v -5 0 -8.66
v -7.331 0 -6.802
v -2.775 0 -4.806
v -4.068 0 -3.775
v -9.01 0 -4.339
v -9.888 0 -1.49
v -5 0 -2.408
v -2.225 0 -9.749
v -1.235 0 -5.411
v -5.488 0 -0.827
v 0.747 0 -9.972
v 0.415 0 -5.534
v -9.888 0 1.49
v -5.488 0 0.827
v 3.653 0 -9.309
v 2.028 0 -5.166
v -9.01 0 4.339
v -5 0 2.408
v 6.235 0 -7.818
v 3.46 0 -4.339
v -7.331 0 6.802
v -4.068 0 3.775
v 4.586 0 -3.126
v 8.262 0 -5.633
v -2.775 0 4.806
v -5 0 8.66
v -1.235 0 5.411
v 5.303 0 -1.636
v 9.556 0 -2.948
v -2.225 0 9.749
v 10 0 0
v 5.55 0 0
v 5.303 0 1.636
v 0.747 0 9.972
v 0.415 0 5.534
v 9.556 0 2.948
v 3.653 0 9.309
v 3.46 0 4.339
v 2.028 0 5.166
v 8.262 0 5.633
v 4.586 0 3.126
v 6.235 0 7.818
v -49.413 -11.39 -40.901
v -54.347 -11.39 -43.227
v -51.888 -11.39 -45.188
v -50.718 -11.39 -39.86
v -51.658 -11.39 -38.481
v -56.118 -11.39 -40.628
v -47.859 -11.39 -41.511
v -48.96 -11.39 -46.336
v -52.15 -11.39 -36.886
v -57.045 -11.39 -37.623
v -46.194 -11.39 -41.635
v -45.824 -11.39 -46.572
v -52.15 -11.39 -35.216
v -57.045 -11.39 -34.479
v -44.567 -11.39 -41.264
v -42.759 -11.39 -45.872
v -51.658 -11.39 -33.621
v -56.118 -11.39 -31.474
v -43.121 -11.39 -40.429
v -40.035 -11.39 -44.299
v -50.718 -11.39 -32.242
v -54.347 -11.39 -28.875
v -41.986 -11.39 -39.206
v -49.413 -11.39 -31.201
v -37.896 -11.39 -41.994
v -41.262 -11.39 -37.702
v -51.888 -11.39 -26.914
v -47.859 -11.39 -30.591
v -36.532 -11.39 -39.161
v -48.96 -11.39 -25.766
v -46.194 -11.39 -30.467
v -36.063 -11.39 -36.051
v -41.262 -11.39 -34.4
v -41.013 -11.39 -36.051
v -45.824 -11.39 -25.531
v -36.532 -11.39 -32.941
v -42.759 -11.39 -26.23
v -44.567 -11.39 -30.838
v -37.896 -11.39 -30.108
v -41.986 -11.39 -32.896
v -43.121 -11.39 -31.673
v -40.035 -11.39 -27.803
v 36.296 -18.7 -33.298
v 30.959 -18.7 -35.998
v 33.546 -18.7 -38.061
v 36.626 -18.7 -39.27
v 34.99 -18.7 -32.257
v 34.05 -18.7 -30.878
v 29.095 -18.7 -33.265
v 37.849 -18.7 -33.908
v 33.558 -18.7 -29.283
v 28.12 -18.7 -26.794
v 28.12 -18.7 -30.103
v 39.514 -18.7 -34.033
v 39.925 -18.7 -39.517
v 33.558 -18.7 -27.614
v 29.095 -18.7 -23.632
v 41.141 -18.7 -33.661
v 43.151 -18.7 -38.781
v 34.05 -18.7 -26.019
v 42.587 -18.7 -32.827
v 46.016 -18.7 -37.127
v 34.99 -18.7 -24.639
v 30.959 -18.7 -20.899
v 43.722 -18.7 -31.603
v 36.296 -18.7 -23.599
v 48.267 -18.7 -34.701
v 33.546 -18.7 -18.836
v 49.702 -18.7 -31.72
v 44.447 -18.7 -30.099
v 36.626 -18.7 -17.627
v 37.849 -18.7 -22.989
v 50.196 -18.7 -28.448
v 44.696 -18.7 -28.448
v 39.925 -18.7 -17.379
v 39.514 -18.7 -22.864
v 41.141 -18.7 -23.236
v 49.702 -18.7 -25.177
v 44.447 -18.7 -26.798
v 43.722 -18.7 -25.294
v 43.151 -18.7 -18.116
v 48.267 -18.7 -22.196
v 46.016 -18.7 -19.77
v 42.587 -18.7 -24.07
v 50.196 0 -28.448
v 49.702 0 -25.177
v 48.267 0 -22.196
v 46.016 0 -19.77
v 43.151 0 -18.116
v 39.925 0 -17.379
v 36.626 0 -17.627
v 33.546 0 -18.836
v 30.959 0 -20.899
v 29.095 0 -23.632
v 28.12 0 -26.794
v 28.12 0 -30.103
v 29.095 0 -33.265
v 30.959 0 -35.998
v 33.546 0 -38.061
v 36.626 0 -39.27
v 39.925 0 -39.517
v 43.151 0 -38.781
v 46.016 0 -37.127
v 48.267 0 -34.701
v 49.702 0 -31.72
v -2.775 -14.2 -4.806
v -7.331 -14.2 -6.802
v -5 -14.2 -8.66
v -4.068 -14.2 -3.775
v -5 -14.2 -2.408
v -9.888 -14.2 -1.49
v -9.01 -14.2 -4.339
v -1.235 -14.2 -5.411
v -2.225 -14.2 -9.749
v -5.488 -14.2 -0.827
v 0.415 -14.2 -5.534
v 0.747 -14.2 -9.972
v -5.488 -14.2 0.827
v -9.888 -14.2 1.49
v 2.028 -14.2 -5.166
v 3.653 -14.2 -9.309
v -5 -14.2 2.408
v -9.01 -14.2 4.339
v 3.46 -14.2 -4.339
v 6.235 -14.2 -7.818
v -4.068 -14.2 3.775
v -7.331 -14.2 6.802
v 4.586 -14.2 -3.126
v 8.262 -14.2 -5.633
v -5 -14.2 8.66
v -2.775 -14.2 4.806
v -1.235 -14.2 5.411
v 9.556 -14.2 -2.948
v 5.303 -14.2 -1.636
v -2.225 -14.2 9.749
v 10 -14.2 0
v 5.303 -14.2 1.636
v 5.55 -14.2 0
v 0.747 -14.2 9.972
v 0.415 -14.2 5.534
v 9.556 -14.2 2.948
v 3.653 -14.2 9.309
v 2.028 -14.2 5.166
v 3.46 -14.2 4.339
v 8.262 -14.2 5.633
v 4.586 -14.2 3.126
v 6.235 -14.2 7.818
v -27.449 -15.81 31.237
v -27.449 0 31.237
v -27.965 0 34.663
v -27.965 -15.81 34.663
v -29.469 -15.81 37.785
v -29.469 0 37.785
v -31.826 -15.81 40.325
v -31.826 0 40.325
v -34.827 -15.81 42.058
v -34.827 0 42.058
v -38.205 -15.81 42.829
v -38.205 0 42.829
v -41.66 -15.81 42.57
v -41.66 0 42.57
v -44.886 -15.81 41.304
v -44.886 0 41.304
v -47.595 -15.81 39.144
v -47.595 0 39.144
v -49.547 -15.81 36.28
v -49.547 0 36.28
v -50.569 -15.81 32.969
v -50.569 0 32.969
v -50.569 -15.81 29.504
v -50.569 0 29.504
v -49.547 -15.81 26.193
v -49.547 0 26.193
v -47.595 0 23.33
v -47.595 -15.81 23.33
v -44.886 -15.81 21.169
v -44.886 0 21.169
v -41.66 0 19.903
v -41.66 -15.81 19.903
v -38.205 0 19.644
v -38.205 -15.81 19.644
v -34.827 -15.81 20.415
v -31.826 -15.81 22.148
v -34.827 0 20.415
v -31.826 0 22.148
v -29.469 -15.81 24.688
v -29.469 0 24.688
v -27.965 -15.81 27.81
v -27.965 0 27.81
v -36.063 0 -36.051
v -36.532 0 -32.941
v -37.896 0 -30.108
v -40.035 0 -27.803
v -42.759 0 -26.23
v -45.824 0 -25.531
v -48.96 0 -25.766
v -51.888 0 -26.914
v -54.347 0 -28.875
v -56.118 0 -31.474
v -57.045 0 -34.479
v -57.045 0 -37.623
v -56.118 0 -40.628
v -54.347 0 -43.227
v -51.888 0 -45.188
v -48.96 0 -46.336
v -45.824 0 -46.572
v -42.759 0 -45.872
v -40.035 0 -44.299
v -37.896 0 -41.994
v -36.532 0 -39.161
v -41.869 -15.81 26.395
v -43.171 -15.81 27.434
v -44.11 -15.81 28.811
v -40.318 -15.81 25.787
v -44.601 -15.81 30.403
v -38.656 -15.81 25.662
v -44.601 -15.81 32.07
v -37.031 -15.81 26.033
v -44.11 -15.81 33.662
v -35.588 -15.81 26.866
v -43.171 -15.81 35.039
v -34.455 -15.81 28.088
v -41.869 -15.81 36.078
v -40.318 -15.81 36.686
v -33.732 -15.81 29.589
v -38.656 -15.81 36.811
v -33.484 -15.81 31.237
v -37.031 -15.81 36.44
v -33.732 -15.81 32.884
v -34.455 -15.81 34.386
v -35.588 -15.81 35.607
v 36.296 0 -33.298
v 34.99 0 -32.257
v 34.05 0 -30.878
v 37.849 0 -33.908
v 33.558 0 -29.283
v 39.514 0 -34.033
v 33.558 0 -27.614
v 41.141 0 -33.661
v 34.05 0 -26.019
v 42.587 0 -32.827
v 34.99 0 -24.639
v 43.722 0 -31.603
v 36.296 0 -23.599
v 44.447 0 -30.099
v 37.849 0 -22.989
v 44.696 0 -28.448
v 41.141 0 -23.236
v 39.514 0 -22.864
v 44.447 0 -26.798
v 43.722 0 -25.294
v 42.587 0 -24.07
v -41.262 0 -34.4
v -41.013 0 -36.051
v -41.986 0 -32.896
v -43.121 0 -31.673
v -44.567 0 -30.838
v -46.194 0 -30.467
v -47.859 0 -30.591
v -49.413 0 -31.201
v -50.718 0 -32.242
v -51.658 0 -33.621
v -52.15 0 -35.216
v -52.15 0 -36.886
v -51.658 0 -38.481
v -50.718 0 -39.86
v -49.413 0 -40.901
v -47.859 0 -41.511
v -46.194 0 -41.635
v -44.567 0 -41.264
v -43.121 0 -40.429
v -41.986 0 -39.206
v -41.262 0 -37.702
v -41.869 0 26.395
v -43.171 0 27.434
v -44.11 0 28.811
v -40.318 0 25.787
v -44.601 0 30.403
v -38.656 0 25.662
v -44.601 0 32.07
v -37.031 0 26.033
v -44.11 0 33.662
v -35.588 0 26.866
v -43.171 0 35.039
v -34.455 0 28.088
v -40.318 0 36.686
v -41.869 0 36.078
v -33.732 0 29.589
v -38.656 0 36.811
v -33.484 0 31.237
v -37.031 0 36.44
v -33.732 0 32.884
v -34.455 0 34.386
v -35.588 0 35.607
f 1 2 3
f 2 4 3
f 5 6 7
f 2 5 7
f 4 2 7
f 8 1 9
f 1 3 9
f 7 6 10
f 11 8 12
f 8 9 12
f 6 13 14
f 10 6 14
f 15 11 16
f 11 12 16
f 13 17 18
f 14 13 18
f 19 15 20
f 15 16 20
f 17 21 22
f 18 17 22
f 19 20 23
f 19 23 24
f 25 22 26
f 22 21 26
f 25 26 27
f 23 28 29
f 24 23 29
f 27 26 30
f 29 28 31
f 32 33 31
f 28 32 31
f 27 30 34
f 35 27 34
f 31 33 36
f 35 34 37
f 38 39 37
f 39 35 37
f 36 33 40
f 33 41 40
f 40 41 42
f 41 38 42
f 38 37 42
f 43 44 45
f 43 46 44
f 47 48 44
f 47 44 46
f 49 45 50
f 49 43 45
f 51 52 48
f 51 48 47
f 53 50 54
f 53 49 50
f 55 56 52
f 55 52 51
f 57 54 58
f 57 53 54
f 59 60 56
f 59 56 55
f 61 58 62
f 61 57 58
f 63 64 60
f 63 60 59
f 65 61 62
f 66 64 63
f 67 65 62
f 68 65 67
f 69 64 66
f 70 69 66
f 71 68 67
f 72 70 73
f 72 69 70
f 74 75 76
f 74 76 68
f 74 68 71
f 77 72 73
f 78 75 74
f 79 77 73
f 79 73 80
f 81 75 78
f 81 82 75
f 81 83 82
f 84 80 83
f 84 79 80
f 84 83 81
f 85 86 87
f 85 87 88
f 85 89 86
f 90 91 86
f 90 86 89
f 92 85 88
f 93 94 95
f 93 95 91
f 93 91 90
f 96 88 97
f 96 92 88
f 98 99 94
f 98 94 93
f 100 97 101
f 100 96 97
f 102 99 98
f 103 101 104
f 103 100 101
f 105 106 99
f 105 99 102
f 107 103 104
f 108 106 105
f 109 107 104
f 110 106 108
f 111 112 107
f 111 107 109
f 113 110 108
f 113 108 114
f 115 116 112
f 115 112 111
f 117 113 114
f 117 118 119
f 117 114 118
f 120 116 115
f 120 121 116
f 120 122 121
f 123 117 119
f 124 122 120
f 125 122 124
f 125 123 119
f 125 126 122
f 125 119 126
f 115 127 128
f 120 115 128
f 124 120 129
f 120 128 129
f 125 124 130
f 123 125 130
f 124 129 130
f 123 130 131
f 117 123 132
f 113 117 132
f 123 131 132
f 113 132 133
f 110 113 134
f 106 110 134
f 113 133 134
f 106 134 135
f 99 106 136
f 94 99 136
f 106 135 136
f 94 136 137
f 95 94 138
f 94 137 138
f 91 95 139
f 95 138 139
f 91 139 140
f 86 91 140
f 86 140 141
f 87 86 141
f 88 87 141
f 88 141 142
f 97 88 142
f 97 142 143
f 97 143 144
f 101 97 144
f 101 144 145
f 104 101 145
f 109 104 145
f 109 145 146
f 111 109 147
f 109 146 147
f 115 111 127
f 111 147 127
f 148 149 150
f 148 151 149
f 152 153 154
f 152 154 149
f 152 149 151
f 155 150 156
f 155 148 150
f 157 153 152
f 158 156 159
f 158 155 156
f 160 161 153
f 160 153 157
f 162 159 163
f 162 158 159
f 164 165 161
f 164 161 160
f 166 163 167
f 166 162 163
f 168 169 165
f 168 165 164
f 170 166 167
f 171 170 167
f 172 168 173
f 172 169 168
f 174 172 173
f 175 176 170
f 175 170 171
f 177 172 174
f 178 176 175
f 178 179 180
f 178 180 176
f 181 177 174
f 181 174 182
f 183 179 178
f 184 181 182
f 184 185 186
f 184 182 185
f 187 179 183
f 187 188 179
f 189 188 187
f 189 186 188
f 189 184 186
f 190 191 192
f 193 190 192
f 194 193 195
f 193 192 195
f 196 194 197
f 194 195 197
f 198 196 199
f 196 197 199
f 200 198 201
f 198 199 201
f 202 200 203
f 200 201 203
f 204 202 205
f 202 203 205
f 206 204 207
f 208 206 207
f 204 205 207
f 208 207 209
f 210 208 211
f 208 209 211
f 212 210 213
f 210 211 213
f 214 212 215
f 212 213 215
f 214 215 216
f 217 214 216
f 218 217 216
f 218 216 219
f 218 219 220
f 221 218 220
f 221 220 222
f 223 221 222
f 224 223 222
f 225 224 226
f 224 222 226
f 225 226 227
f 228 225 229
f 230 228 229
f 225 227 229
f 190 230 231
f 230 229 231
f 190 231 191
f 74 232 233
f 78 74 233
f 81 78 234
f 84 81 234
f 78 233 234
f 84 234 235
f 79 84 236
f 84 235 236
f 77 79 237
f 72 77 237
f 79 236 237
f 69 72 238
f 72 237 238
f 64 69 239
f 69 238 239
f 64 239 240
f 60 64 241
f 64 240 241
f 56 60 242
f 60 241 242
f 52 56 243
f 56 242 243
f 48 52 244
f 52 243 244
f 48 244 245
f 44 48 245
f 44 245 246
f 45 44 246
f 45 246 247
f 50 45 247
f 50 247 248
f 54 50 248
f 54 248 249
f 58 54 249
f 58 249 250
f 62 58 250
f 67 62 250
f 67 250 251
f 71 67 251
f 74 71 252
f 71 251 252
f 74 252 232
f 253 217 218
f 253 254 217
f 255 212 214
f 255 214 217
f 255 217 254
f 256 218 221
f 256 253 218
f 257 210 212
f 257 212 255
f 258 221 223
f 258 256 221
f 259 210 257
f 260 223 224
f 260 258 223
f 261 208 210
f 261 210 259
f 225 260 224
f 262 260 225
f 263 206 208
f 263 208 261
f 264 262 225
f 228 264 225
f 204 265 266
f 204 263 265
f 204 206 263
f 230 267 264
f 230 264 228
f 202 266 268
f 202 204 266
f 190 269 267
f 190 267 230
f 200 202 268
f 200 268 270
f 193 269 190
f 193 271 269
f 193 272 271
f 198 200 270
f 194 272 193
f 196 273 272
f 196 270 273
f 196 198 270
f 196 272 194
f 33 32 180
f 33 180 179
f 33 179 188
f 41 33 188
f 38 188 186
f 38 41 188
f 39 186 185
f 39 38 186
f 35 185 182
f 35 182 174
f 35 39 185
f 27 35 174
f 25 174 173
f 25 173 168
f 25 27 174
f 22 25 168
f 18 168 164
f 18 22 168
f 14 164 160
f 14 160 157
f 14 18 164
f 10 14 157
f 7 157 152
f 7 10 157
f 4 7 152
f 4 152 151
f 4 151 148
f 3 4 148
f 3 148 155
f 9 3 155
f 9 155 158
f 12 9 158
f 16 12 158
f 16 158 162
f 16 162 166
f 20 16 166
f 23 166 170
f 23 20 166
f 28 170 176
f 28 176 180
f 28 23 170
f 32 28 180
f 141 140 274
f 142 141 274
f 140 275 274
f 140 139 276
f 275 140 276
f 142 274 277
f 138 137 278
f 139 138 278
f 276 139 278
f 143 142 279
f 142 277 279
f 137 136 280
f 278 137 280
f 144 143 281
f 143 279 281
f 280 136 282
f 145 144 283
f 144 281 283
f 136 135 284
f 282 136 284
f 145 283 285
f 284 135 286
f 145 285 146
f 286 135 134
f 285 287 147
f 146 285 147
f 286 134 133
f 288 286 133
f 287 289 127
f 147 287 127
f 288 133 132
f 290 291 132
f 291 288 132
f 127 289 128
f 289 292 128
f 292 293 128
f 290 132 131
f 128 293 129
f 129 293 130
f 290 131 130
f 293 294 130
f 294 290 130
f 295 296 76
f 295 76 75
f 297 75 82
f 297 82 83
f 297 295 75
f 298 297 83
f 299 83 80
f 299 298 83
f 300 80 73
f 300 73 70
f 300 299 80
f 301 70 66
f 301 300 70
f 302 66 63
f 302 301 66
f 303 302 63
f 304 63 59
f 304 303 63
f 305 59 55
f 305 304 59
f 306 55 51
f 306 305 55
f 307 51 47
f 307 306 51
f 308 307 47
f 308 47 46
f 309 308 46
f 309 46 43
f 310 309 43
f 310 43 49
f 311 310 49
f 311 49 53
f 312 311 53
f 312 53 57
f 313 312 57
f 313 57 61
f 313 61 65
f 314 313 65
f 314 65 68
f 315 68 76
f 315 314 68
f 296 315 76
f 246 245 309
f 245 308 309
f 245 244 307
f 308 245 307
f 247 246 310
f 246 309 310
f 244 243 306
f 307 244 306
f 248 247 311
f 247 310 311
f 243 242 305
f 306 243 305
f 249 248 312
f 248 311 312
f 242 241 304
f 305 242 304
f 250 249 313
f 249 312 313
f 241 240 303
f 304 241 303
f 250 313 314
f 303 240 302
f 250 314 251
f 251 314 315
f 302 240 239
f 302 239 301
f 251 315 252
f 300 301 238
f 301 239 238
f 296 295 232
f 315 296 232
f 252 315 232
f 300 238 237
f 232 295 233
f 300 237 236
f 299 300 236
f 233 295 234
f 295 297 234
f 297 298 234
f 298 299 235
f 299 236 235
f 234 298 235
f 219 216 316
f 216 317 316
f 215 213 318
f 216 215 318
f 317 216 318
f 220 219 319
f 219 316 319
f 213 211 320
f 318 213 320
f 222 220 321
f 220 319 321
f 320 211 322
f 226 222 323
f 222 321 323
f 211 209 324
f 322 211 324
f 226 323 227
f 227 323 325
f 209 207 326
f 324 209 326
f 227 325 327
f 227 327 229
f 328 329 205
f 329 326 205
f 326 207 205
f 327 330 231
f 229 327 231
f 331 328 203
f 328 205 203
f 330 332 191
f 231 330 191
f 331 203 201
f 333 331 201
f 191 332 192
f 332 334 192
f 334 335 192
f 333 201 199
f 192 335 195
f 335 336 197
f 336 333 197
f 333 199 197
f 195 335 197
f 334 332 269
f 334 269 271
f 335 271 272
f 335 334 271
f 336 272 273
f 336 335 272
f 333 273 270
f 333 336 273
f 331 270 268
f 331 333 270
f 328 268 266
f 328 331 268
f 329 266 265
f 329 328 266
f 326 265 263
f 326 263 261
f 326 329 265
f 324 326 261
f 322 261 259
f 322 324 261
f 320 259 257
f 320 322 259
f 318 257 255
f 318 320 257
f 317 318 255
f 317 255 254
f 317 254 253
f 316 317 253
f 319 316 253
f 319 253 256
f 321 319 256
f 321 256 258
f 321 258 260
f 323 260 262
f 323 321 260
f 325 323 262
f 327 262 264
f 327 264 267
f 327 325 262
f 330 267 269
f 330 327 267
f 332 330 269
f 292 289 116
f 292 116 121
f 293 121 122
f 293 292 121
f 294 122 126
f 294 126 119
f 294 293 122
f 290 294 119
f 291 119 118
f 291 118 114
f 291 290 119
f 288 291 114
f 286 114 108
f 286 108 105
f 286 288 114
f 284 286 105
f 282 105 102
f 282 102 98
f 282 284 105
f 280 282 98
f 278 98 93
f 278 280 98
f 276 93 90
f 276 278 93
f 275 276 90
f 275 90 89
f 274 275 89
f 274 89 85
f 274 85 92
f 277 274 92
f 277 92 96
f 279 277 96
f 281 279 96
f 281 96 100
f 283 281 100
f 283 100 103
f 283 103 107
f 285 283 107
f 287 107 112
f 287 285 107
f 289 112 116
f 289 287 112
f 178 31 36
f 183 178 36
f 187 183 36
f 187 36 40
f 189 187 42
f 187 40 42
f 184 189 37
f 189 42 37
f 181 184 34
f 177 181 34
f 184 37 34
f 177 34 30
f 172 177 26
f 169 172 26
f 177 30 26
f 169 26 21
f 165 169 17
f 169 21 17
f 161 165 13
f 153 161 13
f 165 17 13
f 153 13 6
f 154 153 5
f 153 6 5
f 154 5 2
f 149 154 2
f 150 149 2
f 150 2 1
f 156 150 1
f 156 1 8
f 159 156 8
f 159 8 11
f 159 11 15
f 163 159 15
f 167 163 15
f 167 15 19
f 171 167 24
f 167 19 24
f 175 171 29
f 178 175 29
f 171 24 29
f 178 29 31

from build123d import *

# Parameters (mm, degrees)
F0_R     = 10
F0_R_2   = 5.55
F1_DEPTH = 14.2
F2_R     = 11.625
F2_R_2   = 5.59
F3_DEPTH = 15.81
F4_R     = 10.55
F4_R_2   = 5.6
F5_DEPTH = 11.39
F6_R     = 11.1
F6_R_2   = 5.6
F7_DEPTH = 18.7


with BuildPart() as f1:
    # F0 (on Front) → F1 (new body)
    with BuildSketch(Plane.XZ):
        Circle(F0_R)
        Circle(F0_R_2, mode=Mode.SUBTRACT)
    extrude(amount=F1_DEPTH)


with BuildPart() as f3:
    # F2 (on Front) → F3 (new body)
    with BuildSketch(Plane.XZ):
        with Locations((-39.073661, 31.236561)):
            Circle(F2_R)
        with Locations((-39.073661, 31.236561)):
            Circle(F2_R_2, mode=Mode.SUBTRACT)
    extrude(amount=F3_DEPTH)


with BuildPart() as f5:
    # F4 (on Front) → F5 (new body)
    with BuildSketch(Plane.XZ):
        with Locations((-46.612881, -36.051001)):
            Circle(F4_R)
        with Locations((-46.612881, -36.051001)):
            Circle(F4_R_2, mode=Mode.SUBTRACT)
    extrude(amount=F5_DEPTH)


with BuildPart() as f7:
    # F6 (on Front) → F7 (new body)
    with BuildSketch(Plane.XZ):
        with Locations((39.09554, -28.448422)):
            Circle(F6_R)
        with Locations((39.09554, -28.448422)):
            Circle(F6_R_2, mode=Mode.SUBTRACT)
    extrude(amount=F7_DEPTH)


solid = Compound([f1.part, f3.part, f5.part, f7.part])
